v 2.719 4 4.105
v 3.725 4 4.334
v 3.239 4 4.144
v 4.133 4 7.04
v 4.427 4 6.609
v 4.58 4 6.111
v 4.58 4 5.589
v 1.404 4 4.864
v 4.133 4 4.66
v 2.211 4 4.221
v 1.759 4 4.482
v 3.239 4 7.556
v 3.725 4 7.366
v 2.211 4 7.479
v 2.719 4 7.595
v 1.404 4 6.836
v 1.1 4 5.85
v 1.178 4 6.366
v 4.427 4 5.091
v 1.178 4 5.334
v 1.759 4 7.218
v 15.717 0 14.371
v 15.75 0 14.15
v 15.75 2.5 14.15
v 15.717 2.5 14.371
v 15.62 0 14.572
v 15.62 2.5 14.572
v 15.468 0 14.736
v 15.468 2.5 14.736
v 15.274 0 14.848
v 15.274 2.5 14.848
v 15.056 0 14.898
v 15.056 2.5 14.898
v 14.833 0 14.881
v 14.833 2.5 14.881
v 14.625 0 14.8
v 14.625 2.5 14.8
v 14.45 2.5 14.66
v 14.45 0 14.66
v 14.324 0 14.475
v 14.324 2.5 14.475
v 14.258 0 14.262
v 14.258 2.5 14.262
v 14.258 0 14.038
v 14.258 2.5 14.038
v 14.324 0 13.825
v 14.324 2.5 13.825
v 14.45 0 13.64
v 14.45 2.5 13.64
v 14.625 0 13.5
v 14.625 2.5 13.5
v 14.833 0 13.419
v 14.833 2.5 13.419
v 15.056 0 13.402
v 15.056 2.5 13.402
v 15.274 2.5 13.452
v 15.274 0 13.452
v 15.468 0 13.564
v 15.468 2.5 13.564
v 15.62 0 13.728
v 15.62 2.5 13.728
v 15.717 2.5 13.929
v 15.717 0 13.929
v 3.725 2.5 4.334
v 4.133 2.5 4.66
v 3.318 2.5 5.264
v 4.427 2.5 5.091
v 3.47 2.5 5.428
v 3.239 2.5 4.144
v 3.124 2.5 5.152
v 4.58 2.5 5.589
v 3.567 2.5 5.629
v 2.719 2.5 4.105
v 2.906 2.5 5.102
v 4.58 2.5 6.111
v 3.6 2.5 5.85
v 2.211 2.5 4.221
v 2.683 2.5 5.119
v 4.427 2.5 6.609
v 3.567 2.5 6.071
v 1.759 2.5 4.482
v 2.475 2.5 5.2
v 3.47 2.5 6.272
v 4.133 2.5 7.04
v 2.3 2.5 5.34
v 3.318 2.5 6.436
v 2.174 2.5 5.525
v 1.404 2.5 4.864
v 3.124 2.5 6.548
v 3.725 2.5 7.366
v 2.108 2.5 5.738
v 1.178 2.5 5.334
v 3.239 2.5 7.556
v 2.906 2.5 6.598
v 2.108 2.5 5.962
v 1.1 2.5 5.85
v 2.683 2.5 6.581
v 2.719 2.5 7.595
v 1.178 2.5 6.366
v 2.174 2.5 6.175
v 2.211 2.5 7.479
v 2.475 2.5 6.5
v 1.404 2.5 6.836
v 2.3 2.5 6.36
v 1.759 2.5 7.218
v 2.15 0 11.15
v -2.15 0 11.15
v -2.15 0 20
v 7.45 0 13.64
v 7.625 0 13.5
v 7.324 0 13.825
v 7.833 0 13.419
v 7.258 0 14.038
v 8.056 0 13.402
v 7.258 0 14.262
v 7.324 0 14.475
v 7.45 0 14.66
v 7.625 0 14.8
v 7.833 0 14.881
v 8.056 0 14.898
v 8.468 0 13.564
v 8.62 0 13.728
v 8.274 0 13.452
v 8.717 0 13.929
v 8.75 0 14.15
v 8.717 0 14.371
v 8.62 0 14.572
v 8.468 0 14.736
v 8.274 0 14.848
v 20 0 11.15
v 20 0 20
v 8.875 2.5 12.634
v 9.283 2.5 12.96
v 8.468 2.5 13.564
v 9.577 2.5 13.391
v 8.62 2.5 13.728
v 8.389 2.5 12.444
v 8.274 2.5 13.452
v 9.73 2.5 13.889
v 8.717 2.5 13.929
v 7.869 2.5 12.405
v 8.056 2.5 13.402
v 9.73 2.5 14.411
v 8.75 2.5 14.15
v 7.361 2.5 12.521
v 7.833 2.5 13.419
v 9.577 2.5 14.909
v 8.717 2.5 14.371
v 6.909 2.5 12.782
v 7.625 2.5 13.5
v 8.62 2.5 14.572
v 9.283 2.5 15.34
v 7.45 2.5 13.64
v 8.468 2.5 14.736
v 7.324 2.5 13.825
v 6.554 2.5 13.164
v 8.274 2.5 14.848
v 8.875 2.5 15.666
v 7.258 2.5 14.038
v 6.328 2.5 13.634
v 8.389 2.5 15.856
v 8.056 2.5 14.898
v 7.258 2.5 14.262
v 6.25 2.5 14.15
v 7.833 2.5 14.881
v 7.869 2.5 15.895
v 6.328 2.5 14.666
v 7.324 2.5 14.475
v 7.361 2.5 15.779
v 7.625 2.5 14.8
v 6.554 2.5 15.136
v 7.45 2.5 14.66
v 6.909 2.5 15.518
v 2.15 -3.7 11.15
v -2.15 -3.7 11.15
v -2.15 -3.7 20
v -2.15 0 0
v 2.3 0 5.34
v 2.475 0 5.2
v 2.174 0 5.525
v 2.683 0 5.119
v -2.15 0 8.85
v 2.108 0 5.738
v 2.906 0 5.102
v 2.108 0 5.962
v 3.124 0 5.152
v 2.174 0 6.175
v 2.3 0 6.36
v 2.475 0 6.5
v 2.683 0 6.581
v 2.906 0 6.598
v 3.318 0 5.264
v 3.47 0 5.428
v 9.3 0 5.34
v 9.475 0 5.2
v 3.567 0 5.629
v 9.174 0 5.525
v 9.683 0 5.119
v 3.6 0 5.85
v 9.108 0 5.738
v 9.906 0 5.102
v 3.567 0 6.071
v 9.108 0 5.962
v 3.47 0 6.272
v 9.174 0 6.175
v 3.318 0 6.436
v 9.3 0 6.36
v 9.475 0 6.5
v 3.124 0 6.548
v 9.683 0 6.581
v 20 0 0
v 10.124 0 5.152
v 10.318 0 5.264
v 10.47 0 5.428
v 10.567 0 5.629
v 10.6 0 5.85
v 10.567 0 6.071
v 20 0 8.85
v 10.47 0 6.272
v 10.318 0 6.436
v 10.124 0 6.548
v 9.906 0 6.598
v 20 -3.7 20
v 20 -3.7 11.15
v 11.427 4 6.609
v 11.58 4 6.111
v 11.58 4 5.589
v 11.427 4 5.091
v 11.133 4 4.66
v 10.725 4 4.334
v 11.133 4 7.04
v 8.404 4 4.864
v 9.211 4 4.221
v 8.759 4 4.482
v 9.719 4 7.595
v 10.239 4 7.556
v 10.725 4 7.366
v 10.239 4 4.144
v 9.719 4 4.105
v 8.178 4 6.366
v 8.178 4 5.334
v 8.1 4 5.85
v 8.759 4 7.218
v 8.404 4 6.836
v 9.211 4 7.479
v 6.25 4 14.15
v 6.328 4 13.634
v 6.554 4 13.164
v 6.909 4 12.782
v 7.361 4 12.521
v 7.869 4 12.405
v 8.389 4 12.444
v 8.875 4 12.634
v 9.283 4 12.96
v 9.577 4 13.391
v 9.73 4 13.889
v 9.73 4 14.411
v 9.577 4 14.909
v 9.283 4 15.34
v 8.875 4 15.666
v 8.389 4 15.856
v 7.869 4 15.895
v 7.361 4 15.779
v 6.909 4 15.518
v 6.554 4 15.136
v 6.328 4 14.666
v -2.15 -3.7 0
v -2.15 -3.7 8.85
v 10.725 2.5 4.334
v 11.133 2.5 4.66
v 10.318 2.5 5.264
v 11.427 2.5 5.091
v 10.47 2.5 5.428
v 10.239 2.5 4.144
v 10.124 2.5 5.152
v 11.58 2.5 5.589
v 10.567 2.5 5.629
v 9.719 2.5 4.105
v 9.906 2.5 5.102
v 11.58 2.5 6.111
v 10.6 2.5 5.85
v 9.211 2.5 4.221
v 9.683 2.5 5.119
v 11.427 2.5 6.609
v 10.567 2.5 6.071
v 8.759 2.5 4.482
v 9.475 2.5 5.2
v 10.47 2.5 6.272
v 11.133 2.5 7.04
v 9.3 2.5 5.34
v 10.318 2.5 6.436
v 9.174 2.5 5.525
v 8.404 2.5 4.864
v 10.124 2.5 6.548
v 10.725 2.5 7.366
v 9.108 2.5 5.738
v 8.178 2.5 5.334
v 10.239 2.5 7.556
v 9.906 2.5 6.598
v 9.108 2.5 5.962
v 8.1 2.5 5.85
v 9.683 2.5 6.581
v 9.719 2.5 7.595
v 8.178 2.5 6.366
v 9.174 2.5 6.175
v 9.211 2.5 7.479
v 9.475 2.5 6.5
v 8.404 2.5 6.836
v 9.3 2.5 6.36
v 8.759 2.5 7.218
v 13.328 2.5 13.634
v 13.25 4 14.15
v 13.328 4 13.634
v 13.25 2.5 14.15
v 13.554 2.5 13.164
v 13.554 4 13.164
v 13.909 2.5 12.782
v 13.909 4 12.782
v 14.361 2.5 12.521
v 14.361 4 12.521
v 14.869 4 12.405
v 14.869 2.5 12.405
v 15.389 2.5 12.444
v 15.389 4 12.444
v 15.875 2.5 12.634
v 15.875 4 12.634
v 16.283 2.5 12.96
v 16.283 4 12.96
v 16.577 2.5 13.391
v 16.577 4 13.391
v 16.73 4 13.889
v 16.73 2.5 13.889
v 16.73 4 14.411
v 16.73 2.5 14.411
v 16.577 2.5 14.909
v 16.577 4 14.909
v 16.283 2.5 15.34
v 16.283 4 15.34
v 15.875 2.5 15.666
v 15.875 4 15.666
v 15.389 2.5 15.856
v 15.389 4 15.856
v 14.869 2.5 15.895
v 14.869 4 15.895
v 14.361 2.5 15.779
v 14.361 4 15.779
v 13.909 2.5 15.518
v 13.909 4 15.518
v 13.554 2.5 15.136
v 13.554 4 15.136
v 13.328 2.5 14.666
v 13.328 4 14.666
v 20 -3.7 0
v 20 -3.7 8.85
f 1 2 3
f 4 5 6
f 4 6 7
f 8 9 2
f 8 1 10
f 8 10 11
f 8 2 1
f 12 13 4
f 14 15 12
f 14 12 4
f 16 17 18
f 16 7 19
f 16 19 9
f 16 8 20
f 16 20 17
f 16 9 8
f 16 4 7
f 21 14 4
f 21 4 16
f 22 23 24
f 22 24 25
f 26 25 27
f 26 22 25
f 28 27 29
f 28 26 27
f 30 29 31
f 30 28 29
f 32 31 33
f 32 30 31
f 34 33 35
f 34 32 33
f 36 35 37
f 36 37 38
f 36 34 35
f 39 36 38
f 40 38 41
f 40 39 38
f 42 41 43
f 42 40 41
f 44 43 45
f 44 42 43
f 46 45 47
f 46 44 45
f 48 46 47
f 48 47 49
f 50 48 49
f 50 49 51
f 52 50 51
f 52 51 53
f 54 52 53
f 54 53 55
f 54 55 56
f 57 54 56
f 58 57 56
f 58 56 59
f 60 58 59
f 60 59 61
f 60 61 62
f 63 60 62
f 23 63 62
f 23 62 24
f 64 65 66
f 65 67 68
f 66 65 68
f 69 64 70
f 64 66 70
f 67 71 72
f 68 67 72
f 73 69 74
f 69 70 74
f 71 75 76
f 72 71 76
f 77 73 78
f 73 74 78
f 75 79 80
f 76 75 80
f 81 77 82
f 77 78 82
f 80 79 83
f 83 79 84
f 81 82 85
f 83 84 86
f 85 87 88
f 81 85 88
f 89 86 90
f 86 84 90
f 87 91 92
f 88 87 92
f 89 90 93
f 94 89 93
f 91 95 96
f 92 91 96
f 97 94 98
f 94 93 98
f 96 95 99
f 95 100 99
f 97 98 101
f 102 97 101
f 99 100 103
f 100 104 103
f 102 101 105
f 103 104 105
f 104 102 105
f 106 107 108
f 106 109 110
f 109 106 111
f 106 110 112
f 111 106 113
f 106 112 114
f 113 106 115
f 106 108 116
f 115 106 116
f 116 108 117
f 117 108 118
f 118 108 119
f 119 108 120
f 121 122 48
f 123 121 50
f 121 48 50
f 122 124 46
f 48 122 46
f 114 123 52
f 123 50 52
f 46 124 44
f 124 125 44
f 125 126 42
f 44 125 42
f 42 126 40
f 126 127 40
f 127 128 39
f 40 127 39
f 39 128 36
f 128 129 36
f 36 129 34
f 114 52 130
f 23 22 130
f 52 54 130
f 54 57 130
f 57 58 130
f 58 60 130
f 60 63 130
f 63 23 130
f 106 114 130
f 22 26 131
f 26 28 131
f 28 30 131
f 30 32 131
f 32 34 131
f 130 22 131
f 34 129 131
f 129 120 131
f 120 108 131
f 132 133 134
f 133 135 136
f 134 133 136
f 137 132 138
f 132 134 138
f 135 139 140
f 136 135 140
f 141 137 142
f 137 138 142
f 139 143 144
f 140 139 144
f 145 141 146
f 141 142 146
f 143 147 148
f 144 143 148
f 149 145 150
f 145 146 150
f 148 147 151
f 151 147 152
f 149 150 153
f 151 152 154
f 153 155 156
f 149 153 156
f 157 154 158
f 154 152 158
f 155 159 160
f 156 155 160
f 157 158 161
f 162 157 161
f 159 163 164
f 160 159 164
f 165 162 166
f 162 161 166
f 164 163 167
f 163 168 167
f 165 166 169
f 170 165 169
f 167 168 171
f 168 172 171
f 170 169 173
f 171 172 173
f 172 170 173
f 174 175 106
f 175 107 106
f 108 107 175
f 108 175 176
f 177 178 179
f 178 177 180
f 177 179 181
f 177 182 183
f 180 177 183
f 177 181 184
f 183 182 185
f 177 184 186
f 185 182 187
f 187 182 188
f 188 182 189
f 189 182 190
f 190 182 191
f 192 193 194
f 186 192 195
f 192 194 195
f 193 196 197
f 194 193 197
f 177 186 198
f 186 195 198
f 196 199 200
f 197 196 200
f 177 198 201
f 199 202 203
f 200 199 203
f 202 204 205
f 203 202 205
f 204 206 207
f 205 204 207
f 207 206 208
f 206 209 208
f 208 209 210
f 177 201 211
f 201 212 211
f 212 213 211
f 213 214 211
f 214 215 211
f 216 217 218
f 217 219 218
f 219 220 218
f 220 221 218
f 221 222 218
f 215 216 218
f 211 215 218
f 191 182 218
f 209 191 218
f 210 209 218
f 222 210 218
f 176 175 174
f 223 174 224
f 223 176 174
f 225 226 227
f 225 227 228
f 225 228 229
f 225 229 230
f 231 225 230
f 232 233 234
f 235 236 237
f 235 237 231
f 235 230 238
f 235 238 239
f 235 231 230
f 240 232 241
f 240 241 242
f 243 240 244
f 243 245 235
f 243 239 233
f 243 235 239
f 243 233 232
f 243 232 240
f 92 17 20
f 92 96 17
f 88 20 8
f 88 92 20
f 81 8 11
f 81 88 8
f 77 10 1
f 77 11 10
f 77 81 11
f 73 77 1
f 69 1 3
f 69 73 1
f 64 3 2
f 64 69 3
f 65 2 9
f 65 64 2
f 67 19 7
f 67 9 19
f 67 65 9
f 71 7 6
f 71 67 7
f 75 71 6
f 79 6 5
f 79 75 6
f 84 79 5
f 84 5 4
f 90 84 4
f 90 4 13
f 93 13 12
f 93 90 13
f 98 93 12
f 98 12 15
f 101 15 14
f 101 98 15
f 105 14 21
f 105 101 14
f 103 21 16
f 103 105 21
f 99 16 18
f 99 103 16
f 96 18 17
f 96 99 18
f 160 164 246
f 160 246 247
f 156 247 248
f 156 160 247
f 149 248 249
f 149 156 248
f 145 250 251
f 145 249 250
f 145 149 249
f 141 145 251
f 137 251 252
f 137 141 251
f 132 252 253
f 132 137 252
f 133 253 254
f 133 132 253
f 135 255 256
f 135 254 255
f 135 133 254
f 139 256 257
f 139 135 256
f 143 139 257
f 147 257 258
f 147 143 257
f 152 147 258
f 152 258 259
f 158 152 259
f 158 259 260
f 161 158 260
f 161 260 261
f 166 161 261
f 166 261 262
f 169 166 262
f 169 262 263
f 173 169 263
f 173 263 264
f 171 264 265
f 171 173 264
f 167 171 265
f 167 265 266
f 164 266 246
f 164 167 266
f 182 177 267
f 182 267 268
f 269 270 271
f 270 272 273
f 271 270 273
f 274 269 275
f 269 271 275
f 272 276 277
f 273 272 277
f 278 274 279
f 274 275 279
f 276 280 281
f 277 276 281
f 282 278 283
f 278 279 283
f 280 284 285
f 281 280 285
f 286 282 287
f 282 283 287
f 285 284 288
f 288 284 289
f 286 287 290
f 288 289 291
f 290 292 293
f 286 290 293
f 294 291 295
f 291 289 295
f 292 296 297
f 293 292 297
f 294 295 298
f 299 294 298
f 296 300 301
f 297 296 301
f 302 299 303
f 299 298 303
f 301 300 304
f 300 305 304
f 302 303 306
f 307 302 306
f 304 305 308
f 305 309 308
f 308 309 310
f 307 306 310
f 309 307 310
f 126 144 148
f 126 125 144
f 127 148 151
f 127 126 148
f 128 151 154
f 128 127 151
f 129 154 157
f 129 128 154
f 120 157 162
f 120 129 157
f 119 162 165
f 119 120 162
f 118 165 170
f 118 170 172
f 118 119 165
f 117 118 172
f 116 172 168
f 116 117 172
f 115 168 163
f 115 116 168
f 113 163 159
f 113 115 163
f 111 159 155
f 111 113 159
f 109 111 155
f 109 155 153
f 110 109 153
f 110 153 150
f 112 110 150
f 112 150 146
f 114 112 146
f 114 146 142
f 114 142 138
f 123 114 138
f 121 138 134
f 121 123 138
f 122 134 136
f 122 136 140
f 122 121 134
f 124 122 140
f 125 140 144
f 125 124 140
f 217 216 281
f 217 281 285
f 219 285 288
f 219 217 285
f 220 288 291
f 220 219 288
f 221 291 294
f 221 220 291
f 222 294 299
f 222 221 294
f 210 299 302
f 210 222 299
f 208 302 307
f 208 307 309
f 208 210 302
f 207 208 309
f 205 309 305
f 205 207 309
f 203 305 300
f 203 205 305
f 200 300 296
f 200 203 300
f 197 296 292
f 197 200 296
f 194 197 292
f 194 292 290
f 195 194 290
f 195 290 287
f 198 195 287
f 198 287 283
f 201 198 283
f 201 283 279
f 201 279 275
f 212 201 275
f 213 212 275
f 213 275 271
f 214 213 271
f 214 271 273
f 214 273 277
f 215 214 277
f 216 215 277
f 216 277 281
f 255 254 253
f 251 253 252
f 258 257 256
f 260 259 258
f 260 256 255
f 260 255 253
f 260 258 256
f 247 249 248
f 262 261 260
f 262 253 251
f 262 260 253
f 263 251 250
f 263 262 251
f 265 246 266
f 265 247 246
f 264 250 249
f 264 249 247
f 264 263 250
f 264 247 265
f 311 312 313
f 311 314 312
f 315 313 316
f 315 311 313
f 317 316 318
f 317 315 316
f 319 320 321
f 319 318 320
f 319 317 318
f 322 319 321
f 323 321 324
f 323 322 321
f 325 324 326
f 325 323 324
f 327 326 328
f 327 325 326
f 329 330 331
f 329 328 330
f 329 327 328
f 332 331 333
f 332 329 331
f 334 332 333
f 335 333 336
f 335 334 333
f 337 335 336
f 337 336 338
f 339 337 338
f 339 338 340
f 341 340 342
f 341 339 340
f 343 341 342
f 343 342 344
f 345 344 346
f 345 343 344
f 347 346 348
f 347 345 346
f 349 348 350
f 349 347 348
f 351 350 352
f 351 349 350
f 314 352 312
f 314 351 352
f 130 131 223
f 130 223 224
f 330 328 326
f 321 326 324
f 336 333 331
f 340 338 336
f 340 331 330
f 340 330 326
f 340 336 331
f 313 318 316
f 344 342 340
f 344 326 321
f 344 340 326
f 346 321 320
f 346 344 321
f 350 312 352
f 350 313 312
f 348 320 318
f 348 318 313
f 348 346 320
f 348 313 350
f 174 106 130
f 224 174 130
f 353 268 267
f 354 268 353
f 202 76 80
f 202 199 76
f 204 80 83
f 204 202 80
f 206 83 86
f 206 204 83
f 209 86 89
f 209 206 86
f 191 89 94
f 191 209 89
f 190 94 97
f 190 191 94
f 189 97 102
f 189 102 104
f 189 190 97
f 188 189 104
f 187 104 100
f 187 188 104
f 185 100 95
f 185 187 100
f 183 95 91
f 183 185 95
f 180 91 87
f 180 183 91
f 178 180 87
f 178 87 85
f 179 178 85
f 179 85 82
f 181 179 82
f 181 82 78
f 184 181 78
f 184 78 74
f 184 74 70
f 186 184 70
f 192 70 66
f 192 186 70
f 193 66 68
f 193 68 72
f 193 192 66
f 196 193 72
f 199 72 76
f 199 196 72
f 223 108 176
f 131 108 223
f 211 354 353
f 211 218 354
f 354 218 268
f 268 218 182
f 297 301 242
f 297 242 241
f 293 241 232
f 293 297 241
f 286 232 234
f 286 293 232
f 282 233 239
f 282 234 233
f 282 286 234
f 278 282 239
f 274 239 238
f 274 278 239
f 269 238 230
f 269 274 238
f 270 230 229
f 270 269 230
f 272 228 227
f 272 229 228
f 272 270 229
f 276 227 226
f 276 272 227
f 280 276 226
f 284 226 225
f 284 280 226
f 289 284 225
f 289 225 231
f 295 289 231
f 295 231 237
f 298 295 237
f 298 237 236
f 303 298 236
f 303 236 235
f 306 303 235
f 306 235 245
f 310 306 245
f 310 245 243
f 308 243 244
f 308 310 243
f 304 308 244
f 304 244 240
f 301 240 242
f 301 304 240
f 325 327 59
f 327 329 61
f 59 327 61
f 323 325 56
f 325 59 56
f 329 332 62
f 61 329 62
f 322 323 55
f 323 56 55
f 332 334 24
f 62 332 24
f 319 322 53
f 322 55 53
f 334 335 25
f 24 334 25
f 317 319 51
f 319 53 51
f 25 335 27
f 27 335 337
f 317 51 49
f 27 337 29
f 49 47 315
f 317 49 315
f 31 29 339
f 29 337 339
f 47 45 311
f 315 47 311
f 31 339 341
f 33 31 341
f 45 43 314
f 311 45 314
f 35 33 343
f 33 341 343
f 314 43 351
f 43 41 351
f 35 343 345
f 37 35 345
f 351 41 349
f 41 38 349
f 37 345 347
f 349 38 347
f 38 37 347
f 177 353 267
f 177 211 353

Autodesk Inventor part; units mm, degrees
ref_plane "YZ Plane" through (0, 0, 0) normal (1, 0, 0) x (0, 1, 0)
ref_plane "XZ Plane" through (0, 0, 0) normal (0, 1, 0) x (-1, 0, 0)
ref_plane "XY Plane" through (0, 0, 0) normal (0, 0, 1) x (1, 0, 0)
sketch "Sketch1" plane through (0, 0, 0) normal (0, 1, 0) x (-1, 0, 0)
  line L0 (-2.15, 11.15) -> (2.15, 11.15)
  line L1 (2.15, 11.15) -> (2.15, -11.15)
  line L2 (2.15, -11.15) -> (-2.15, -11.15)
  line L3 (-2.15, -11.15) -> (-2.15, 11.15)
  line L4 (-2.15, 11.15) -> (2.15, -11.15) construction
  line L5 (2.15, 11.15) -> (-2.15, -11.15) construction
  line L6 (-20, 20) -> (20, 20)
  line L7 (20, 20) -> (20, -20)
  line L8 (20, -20) -> (-20, -20)
  line L9 (-20, -20) -> (-20, 20)
  line L10 (-20, 20) -> (20, -20) construction
  line L11 (20, 20) -> (-20, -20) construction
  line L12 (2.15, -11.15) -> (-20, -11.15)
  line L13 (2.15, 11.15) -> (2.15, -20)
  line L14 (-2.15, 11.15) -> (20, 11.15)
  line L15 (-2.15, -11.15) -> (-2.15, 20)
  line L16 (2.15, -11.15) -> (-0.85, -11.15)
  line L17 (2.15, -14.15) -> (2.15, -11.15)
  point P0 (0, 0)
  dimension "d0" = 4.3
  dimension "d1" = 22.3
  dimension "d2" = 40
  dimension "d3" = 40
extrude "Extrusion1" add sketch "Sketch1" along normal blind 3.7 contours L15 L6 L7 L14 L0 | L2 L13 L8 L9 L12
sketch "Sketch6" plane through (0, 0, 0) normal (0, 1, 0) x (-1, 0, 0)
  line L0 (-20, -16.15) -> (-20, -11.15)
  circle A0 centre (-15, -14.15) radius 0.75
  circle A1 centre (-8, -14.15) radius 0.75
  line L1 (-2.15, 11.15) -> (20, 11.15) projected
  circle A2 centre (15, 14.15) radius 0.75
  circle A3 centre (8, 14.15) radius 0.75
  point P0 (0, 0)
  dimension "d58" = 1.5
  dimension "d59" = 1.5
  dimension "d64" = 1.5
  dimension "d76" = 1.5
extrude "Extrusion5" add sketch "Sketch6" against normal blind 2.5
sketch "Sketch9" plane through (15, -2.5, -14.15) normal (0, -1, 0) x (1, 0, 0)
  circle A0 centre (0, 0) radius 0.75 projected
  circle A1 centre (0, 0) radius 1.75
  circle A2 centre (-7, 0) radius 0.75 projected
  circle A3 centre (-7, 0) radius 1.75
  circle A4 centre (-23, 28.3) radius 0.75 projected
  circle A5 centre (-23, 28.3) radius 1.75
  circle A6 centre (-30, 28.3) radius 0.75 projected
  circle A7 centre (-30, 28.3) radius 1.75
  point P0 (-15, 14.15)
  dimension "d77" = 3.5
  dimension "d78" = 3.5
  dimension "d79" = 3.5
  dimension "d80" = 3.5
extrude "Extrusion8" add sketch "Sketch9" along normal blind 1.5 contours A0 | A1 | A2 | A3 | A4 | A5 | A6 | A7
move or copy body "Move Body1" bodies to move or copy 1 copy no rotation origin (0, 0, 0) rotation axis (0, 0, 1) rotation angle 180
split body "Split1" sketch "Sketch1" result two bodies curves L14 first body at (6.6667, -3.2, 17.05)
move or copy body "Move Body2" bodies to move or copy 3 copy no translate (17.85, 0, 20)
properties part number "top-small"
